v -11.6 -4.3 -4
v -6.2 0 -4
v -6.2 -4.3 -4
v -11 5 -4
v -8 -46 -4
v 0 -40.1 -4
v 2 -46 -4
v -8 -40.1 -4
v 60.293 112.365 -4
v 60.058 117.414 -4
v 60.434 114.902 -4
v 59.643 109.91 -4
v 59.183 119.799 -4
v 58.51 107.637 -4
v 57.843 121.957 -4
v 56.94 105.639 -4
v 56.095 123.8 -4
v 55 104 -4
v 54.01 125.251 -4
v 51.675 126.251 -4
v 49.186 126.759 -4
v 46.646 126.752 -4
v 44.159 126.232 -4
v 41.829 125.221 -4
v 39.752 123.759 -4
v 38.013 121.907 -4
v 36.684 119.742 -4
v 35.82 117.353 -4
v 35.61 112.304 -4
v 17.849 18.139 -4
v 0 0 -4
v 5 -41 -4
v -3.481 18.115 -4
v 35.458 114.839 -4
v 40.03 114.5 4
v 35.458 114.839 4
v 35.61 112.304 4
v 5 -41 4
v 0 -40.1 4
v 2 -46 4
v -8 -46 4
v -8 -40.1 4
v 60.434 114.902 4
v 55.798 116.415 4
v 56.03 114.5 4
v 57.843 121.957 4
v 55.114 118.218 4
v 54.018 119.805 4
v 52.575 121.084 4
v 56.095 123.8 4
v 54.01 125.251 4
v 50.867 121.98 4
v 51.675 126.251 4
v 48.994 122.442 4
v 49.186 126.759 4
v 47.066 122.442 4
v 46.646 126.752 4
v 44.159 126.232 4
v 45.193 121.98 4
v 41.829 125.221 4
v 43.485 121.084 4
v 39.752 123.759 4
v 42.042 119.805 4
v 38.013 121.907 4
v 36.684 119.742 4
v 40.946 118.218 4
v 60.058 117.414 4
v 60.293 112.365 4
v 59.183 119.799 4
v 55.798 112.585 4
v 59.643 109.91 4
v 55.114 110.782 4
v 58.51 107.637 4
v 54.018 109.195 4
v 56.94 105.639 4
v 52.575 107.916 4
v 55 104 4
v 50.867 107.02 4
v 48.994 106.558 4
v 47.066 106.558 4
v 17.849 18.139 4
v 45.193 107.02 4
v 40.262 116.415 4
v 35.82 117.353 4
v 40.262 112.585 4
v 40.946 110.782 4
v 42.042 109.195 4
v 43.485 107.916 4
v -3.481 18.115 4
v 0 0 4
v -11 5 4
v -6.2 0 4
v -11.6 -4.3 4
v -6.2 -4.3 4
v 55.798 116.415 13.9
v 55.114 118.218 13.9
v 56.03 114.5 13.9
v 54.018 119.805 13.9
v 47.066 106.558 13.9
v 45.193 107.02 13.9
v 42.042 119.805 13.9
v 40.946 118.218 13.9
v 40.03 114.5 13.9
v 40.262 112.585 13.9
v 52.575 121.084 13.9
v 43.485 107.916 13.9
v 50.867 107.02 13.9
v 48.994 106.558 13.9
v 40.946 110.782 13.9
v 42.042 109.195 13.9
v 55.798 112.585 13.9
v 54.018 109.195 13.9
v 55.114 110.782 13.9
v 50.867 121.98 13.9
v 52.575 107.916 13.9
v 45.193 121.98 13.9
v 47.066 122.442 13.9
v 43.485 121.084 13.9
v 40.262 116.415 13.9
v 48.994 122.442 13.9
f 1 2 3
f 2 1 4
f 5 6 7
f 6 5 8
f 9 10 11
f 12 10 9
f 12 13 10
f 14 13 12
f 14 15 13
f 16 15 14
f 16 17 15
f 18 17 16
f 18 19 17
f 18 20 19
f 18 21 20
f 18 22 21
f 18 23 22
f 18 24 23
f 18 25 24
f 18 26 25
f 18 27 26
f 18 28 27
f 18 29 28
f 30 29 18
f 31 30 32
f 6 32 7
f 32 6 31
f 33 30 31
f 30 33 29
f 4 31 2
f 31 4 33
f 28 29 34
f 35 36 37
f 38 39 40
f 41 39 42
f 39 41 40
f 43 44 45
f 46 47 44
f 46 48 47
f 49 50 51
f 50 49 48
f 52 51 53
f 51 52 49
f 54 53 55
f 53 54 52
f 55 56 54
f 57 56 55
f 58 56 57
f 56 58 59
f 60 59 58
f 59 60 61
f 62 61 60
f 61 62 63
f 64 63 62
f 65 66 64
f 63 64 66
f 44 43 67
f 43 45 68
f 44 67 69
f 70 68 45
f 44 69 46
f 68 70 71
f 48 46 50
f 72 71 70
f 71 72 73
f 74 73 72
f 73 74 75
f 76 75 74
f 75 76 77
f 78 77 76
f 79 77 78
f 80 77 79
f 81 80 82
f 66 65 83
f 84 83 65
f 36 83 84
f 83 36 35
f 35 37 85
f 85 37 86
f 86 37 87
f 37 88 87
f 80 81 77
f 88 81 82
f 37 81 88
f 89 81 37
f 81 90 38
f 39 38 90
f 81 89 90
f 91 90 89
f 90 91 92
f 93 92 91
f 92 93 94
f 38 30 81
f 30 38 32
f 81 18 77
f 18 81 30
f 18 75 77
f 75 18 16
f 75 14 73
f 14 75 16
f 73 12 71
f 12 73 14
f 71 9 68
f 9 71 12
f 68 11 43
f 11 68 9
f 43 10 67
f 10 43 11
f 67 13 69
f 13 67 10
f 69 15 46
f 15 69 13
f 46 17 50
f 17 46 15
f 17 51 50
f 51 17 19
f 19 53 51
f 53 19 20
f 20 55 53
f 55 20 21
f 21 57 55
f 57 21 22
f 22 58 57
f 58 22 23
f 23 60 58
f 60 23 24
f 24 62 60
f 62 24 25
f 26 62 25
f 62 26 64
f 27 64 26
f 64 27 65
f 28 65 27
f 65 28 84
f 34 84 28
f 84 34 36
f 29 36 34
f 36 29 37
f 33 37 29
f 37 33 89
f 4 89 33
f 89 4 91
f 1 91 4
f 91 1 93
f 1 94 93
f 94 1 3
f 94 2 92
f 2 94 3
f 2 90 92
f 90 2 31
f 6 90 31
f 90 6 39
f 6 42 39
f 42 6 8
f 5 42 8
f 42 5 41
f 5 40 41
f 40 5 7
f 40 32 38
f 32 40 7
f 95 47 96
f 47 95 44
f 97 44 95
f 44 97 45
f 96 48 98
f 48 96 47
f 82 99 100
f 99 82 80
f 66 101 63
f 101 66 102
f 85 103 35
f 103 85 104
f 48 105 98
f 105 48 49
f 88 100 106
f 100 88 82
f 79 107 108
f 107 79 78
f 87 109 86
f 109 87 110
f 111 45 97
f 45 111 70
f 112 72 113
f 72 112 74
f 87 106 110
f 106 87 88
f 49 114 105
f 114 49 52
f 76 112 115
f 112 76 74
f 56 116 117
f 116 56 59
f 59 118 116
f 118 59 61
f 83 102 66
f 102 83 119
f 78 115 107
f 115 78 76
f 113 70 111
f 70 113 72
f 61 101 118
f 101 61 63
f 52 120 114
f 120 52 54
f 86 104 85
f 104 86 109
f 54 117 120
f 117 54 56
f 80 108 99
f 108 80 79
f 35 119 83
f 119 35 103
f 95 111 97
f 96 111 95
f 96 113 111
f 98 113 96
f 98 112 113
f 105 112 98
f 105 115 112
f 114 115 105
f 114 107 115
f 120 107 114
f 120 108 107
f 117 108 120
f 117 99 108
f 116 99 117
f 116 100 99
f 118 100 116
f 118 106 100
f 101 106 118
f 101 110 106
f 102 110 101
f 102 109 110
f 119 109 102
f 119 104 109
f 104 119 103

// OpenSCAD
linear_extrude(height = 8, center = true, convexity = 5)
   import (file = "spool holdahMK3.dxf", layer = "0");
translate([51.53-3.5,123-5-3.5,3.9])cylinder(h = 10, r=8);
//translate([51.5,123,31])cylinder(h = 6, r1=8, r2=12.5);
//translate([51.5,123,37])cylinder(h = 2, r=12.5);
